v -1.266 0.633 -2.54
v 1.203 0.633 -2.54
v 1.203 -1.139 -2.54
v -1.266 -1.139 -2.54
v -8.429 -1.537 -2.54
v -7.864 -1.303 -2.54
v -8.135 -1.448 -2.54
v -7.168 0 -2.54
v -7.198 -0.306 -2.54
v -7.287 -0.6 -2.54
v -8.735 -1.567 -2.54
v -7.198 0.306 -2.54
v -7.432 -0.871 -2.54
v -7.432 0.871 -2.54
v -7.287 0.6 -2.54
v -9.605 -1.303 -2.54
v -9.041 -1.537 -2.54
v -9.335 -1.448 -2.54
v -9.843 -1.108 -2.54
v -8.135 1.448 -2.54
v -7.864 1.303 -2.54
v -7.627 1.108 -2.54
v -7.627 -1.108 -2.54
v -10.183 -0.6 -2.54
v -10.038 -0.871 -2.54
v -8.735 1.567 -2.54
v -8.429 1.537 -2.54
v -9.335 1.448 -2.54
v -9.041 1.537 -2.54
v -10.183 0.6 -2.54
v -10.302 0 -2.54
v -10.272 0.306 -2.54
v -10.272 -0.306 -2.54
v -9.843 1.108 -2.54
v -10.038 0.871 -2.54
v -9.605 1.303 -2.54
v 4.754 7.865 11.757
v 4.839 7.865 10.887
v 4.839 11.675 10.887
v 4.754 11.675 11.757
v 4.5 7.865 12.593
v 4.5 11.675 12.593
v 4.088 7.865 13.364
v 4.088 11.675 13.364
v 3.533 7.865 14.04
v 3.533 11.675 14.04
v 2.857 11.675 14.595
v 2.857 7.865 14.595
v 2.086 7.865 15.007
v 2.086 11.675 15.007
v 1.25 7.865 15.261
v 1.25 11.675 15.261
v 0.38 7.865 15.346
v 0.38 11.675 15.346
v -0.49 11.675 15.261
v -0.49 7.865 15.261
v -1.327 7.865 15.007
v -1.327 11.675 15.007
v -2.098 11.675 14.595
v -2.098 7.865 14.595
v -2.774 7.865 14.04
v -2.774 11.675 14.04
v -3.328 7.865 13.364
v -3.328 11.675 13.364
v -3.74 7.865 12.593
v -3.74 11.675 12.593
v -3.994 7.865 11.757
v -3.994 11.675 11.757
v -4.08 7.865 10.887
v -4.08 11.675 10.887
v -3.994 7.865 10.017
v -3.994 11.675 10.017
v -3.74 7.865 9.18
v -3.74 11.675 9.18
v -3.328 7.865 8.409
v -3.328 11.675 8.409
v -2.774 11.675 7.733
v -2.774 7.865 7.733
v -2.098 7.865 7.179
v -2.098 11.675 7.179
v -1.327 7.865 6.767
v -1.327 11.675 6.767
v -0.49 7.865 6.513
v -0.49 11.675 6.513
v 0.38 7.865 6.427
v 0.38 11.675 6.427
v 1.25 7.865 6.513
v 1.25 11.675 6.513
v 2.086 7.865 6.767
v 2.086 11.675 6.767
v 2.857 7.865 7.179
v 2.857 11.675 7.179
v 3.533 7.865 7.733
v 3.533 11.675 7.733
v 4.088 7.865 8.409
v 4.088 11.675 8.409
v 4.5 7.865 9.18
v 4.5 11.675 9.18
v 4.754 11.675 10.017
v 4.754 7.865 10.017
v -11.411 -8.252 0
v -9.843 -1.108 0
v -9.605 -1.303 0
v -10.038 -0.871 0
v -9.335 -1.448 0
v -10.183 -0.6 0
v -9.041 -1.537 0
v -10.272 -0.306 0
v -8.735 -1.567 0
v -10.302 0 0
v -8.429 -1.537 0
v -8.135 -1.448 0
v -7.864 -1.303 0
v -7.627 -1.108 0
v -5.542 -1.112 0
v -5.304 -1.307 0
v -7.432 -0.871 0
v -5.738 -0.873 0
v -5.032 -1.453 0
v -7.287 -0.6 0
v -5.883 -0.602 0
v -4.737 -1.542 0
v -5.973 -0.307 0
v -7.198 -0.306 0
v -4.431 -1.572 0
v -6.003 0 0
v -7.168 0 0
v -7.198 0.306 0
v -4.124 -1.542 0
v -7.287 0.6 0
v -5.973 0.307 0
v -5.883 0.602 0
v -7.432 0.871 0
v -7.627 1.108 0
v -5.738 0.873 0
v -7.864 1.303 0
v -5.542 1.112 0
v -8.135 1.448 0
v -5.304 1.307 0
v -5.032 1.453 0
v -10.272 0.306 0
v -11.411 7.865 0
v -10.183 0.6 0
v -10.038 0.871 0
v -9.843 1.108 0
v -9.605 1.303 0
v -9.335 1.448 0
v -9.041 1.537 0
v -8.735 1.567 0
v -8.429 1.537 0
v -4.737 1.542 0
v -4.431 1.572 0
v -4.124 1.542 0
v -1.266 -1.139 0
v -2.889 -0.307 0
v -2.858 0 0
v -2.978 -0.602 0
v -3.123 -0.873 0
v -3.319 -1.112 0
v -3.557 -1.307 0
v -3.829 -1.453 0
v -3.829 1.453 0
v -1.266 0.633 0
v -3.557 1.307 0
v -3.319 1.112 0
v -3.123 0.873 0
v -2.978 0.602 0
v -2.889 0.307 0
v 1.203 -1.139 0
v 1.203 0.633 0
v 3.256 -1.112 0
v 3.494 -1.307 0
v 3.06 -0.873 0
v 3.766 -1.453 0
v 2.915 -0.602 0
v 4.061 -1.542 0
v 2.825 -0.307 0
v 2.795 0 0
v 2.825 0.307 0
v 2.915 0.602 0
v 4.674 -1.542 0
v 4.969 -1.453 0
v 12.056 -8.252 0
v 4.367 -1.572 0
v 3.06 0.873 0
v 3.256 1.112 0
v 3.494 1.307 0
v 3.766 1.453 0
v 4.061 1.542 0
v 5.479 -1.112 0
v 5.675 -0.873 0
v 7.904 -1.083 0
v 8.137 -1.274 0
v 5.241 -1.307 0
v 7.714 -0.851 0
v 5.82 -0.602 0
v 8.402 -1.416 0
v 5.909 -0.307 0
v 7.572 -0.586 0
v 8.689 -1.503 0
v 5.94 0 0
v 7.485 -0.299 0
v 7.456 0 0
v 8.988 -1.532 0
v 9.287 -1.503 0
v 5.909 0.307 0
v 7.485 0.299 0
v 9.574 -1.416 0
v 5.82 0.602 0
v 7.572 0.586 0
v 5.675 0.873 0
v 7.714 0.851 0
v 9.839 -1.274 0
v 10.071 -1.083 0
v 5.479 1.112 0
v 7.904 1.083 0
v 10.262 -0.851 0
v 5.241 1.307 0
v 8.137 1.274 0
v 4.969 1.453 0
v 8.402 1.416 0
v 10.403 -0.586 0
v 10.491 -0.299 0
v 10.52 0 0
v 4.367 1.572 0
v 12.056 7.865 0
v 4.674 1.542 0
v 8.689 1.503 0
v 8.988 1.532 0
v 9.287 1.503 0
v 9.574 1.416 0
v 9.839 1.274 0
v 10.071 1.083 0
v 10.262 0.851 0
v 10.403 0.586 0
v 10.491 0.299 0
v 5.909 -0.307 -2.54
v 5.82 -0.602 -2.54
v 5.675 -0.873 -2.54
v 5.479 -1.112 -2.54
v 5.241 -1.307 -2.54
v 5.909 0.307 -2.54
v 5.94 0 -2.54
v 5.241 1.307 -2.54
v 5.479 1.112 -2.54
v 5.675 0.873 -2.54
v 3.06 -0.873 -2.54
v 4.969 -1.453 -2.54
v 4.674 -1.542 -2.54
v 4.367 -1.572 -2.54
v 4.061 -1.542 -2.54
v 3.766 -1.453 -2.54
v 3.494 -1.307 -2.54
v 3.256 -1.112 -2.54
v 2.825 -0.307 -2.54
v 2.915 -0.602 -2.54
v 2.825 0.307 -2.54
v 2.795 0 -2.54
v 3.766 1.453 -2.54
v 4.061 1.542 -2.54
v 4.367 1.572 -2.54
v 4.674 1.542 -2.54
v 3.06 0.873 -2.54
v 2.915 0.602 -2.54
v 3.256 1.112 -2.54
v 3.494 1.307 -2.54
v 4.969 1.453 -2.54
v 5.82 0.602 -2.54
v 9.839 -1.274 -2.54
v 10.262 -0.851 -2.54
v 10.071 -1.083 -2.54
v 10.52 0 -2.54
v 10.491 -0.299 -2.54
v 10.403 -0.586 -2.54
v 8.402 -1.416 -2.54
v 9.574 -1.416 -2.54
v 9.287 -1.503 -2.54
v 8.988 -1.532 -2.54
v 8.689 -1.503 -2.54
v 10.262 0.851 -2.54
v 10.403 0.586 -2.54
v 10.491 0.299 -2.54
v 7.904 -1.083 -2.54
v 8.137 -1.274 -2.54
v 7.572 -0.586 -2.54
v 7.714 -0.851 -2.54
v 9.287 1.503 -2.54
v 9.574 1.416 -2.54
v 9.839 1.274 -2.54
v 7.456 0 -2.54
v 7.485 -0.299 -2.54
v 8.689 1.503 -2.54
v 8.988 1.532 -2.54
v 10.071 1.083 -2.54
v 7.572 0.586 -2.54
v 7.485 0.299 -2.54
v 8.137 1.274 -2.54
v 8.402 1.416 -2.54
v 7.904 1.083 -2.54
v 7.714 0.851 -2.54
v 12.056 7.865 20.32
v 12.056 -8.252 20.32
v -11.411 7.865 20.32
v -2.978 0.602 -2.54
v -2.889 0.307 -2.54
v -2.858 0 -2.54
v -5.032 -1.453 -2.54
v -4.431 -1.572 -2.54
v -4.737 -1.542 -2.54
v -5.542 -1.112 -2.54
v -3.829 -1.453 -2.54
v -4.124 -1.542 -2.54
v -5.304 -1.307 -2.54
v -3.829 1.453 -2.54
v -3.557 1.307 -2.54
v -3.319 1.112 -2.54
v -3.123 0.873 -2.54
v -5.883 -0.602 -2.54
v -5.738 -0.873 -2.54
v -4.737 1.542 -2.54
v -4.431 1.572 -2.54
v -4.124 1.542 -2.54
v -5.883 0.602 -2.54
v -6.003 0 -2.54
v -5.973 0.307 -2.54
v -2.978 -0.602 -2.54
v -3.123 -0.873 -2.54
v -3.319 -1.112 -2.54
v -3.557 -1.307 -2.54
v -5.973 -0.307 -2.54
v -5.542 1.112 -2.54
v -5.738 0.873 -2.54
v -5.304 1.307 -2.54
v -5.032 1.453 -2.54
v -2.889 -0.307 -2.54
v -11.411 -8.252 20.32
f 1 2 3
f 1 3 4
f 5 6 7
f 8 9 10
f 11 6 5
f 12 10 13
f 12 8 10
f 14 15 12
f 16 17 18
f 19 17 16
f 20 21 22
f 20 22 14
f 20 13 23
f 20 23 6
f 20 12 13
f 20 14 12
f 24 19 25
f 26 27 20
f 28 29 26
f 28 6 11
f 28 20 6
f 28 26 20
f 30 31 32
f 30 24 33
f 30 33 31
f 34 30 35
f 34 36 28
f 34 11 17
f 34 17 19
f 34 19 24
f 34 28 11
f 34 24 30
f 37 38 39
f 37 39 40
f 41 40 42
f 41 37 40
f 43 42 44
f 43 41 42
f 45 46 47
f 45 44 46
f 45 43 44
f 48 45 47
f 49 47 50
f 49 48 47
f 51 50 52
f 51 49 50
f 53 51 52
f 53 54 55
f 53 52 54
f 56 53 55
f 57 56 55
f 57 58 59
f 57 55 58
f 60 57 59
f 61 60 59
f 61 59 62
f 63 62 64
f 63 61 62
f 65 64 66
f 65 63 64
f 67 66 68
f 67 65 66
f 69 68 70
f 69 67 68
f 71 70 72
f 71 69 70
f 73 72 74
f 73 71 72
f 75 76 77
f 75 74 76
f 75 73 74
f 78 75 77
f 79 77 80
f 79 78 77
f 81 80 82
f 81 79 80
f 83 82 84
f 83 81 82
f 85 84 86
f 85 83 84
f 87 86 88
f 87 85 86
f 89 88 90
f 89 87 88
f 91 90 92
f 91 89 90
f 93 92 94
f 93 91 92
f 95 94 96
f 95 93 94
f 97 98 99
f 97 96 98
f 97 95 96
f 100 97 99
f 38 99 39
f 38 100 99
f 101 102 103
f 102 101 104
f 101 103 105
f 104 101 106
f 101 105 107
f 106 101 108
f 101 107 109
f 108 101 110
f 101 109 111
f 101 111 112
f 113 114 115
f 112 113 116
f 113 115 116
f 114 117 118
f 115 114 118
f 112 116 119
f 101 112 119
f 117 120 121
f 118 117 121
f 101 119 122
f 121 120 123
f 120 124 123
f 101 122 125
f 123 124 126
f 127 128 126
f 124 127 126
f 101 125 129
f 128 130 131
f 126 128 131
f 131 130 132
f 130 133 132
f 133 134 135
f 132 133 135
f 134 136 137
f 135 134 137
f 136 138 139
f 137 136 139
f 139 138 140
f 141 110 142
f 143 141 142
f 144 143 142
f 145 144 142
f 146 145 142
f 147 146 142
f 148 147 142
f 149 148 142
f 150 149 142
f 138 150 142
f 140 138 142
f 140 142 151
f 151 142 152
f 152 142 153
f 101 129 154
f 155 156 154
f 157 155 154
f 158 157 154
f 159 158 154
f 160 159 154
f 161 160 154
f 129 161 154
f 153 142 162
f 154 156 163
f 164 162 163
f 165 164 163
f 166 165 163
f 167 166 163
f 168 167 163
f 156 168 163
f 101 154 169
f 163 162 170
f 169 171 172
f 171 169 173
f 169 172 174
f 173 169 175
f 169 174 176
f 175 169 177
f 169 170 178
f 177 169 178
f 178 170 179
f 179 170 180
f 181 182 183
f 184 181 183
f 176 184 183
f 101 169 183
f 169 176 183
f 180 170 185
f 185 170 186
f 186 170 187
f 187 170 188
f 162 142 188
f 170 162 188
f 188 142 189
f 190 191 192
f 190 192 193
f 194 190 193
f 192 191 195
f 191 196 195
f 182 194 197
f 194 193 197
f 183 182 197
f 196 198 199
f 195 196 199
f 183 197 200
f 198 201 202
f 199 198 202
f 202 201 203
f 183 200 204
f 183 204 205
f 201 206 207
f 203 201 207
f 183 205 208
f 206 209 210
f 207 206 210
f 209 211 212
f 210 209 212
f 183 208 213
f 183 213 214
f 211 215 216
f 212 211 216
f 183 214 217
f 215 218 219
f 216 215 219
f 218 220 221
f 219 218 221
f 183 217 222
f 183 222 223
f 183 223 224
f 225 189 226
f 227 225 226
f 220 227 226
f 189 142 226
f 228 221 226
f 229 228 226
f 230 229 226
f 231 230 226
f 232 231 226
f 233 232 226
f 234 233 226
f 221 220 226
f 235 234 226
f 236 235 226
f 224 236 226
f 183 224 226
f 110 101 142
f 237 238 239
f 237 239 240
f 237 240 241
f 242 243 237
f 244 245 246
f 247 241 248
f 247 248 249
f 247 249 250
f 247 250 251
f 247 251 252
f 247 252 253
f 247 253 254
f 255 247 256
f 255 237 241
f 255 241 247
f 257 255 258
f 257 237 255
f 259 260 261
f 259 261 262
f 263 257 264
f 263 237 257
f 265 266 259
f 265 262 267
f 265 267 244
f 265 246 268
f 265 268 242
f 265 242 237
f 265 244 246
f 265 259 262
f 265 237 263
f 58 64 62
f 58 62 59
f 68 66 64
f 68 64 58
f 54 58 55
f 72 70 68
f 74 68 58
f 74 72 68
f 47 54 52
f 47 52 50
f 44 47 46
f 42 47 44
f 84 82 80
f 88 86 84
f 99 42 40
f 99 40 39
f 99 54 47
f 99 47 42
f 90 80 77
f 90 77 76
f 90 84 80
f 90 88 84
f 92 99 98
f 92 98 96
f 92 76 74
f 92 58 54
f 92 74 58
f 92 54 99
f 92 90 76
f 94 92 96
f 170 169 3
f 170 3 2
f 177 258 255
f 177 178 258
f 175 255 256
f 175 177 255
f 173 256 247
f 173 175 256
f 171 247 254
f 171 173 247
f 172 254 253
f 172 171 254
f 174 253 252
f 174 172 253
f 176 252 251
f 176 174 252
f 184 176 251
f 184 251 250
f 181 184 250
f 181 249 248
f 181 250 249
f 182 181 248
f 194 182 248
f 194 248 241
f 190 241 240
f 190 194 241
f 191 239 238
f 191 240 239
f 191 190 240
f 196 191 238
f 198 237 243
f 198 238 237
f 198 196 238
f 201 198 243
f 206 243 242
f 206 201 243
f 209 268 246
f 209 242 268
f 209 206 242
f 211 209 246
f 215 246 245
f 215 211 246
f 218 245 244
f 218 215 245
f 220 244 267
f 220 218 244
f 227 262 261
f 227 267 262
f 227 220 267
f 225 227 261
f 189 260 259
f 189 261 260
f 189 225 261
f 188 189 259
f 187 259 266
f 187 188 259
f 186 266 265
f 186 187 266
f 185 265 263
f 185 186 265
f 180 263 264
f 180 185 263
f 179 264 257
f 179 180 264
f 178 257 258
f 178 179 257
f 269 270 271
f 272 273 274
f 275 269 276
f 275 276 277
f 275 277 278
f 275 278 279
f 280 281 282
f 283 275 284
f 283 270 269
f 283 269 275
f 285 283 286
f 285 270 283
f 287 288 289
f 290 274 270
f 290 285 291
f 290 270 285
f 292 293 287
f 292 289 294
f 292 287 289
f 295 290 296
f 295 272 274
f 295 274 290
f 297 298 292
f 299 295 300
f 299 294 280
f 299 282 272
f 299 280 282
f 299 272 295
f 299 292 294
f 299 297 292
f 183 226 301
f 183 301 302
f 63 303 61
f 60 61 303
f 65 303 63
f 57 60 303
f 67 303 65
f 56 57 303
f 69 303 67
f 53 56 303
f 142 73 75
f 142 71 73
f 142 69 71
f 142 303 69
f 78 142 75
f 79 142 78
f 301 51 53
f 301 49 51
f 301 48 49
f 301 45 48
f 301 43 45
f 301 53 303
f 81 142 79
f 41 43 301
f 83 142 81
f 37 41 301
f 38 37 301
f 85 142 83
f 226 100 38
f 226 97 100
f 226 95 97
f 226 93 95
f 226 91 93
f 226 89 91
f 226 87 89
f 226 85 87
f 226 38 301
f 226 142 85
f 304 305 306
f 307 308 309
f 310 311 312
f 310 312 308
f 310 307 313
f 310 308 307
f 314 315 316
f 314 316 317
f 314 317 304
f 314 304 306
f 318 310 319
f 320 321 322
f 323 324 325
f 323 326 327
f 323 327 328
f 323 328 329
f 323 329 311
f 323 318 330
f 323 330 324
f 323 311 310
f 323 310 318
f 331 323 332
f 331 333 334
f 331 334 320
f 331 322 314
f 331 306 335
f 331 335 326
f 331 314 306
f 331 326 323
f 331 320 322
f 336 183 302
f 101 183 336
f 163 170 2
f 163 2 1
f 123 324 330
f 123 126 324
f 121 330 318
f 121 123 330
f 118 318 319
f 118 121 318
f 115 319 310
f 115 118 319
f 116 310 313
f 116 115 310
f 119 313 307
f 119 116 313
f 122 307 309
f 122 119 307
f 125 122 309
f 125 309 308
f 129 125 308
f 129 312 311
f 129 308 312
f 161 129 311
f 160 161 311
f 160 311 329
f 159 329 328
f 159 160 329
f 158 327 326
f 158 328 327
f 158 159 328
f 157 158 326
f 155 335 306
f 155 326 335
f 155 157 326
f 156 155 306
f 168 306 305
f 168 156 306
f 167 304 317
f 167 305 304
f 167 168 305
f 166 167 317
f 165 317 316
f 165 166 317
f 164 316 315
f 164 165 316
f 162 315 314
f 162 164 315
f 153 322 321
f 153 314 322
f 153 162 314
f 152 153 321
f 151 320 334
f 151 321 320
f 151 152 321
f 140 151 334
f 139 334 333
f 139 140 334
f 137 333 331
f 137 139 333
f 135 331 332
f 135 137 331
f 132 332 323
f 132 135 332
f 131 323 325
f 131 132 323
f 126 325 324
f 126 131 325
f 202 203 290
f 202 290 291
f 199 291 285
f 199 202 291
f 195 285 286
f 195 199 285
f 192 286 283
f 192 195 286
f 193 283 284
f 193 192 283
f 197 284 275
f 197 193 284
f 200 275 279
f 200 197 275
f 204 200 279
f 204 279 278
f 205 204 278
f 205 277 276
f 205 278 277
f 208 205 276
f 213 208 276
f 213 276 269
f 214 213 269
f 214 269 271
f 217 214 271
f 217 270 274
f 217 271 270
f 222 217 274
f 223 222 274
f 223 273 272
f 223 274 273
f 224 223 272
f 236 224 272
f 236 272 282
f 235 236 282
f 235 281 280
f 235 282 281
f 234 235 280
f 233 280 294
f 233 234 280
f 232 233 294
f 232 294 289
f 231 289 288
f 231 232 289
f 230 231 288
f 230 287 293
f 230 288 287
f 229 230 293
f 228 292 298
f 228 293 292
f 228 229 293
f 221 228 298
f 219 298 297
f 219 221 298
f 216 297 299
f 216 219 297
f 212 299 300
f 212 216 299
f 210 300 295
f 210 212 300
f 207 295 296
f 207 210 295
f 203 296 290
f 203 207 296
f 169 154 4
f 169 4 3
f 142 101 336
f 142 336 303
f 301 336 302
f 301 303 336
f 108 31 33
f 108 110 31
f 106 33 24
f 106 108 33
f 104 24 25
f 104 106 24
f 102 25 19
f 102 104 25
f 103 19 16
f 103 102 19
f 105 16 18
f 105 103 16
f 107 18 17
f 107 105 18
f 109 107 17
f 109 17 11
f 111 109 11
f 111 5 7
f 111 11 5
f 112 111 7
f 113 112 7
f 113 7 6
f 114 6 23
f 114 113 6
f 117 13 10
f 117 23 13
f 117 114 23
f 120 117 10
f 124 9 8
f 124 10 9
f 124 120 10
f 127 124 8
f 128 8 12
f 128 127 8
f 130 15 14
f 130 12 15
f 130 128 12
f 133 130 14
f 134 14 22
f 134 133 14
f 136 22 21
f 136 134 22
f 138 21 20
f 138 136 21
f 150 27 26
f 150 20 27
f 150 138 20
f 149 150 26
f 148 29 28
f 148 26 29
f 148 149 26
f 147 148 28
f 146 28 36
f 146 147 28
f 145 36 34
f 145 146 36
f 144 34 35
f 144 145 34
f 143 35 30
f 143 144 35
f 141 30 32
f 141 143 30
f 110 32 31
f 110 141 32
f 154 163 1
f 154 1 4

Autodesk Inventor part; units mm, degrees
ref_plane "YZ Plane" through (0, 0, 0) normal (1, 0, 0) x (0, 1, 0)
ref_plane "XZ Plane" through (0, 0, 0) normal (0, 1, 0) x (-1, 0, 0)
ref_plane "XY Plane" through (0, 0, 0) normal (0, 0, 1) x (1, 0, 0)
sketch "Sketch1" plane through (0, 0, 0) normal (0, 0, 1) x (1, 0, 0)
  point P0 (0, 0)
sketch "Sketch2" plane through (0, 0, 0) normal (0, 0, 1) x (1, 0, 0)
  line L0 (-11.4108, 7.8651) -> (12.0555, 7.8651)
  line L1 (12.0555, 7.8651) -> (12.0555, -8.2519)
  line L2 (12.0555, -8.2519) -> (-11.4108, -8.2519)
  line L3 (-11.4108, -8.2519) -> (-11.4108, 7.8651)
  point P0 (0, 0)
extrude "Extrusion1" add sketch "Sketch2" along normal blind 20.32
sketch "Sketch3" plane through (0, 0, 0) normal (0, 0, -1) x (-1, 0, 0)
  circle A0 centre (-8.9879, 0) radius 1.5322
  circle A1 centre (-4.3674, 0) radius 1.5722
  circle A2 centre (4.4307, 0) radius 1.5722
  circle A3 centre (8.7348, 0) radius 1.5671
  line L0 (-1.2026, 0.633) -> (1.2659, 0.633)
  line L1 (1.2659, 0.633) -> (1.2659, -1.1393)
  line L2 (1.2659, -1.1393) -> (-1.2026, -1.1393)
  line L3 (-1.2026, -1.1393) -> (-1.2026, 0.633)
  point P0 (0, 0)
extrude "Extrusion2" add sketch "Sketch3" along normal blind 2.54
sketch "Sketch4" plane through (-11.4108, 7.8651, 0) normal (0, 1, 0) x (1, 0, 0)
  circle A0 centre (11.7906, -10.8868) radius 4.4595
  point P0 (11.4108, 0)
extrude "Extrusion3" add sketch "Sketch4" along normal blind 3.81
properties part number "newcylinder1"
